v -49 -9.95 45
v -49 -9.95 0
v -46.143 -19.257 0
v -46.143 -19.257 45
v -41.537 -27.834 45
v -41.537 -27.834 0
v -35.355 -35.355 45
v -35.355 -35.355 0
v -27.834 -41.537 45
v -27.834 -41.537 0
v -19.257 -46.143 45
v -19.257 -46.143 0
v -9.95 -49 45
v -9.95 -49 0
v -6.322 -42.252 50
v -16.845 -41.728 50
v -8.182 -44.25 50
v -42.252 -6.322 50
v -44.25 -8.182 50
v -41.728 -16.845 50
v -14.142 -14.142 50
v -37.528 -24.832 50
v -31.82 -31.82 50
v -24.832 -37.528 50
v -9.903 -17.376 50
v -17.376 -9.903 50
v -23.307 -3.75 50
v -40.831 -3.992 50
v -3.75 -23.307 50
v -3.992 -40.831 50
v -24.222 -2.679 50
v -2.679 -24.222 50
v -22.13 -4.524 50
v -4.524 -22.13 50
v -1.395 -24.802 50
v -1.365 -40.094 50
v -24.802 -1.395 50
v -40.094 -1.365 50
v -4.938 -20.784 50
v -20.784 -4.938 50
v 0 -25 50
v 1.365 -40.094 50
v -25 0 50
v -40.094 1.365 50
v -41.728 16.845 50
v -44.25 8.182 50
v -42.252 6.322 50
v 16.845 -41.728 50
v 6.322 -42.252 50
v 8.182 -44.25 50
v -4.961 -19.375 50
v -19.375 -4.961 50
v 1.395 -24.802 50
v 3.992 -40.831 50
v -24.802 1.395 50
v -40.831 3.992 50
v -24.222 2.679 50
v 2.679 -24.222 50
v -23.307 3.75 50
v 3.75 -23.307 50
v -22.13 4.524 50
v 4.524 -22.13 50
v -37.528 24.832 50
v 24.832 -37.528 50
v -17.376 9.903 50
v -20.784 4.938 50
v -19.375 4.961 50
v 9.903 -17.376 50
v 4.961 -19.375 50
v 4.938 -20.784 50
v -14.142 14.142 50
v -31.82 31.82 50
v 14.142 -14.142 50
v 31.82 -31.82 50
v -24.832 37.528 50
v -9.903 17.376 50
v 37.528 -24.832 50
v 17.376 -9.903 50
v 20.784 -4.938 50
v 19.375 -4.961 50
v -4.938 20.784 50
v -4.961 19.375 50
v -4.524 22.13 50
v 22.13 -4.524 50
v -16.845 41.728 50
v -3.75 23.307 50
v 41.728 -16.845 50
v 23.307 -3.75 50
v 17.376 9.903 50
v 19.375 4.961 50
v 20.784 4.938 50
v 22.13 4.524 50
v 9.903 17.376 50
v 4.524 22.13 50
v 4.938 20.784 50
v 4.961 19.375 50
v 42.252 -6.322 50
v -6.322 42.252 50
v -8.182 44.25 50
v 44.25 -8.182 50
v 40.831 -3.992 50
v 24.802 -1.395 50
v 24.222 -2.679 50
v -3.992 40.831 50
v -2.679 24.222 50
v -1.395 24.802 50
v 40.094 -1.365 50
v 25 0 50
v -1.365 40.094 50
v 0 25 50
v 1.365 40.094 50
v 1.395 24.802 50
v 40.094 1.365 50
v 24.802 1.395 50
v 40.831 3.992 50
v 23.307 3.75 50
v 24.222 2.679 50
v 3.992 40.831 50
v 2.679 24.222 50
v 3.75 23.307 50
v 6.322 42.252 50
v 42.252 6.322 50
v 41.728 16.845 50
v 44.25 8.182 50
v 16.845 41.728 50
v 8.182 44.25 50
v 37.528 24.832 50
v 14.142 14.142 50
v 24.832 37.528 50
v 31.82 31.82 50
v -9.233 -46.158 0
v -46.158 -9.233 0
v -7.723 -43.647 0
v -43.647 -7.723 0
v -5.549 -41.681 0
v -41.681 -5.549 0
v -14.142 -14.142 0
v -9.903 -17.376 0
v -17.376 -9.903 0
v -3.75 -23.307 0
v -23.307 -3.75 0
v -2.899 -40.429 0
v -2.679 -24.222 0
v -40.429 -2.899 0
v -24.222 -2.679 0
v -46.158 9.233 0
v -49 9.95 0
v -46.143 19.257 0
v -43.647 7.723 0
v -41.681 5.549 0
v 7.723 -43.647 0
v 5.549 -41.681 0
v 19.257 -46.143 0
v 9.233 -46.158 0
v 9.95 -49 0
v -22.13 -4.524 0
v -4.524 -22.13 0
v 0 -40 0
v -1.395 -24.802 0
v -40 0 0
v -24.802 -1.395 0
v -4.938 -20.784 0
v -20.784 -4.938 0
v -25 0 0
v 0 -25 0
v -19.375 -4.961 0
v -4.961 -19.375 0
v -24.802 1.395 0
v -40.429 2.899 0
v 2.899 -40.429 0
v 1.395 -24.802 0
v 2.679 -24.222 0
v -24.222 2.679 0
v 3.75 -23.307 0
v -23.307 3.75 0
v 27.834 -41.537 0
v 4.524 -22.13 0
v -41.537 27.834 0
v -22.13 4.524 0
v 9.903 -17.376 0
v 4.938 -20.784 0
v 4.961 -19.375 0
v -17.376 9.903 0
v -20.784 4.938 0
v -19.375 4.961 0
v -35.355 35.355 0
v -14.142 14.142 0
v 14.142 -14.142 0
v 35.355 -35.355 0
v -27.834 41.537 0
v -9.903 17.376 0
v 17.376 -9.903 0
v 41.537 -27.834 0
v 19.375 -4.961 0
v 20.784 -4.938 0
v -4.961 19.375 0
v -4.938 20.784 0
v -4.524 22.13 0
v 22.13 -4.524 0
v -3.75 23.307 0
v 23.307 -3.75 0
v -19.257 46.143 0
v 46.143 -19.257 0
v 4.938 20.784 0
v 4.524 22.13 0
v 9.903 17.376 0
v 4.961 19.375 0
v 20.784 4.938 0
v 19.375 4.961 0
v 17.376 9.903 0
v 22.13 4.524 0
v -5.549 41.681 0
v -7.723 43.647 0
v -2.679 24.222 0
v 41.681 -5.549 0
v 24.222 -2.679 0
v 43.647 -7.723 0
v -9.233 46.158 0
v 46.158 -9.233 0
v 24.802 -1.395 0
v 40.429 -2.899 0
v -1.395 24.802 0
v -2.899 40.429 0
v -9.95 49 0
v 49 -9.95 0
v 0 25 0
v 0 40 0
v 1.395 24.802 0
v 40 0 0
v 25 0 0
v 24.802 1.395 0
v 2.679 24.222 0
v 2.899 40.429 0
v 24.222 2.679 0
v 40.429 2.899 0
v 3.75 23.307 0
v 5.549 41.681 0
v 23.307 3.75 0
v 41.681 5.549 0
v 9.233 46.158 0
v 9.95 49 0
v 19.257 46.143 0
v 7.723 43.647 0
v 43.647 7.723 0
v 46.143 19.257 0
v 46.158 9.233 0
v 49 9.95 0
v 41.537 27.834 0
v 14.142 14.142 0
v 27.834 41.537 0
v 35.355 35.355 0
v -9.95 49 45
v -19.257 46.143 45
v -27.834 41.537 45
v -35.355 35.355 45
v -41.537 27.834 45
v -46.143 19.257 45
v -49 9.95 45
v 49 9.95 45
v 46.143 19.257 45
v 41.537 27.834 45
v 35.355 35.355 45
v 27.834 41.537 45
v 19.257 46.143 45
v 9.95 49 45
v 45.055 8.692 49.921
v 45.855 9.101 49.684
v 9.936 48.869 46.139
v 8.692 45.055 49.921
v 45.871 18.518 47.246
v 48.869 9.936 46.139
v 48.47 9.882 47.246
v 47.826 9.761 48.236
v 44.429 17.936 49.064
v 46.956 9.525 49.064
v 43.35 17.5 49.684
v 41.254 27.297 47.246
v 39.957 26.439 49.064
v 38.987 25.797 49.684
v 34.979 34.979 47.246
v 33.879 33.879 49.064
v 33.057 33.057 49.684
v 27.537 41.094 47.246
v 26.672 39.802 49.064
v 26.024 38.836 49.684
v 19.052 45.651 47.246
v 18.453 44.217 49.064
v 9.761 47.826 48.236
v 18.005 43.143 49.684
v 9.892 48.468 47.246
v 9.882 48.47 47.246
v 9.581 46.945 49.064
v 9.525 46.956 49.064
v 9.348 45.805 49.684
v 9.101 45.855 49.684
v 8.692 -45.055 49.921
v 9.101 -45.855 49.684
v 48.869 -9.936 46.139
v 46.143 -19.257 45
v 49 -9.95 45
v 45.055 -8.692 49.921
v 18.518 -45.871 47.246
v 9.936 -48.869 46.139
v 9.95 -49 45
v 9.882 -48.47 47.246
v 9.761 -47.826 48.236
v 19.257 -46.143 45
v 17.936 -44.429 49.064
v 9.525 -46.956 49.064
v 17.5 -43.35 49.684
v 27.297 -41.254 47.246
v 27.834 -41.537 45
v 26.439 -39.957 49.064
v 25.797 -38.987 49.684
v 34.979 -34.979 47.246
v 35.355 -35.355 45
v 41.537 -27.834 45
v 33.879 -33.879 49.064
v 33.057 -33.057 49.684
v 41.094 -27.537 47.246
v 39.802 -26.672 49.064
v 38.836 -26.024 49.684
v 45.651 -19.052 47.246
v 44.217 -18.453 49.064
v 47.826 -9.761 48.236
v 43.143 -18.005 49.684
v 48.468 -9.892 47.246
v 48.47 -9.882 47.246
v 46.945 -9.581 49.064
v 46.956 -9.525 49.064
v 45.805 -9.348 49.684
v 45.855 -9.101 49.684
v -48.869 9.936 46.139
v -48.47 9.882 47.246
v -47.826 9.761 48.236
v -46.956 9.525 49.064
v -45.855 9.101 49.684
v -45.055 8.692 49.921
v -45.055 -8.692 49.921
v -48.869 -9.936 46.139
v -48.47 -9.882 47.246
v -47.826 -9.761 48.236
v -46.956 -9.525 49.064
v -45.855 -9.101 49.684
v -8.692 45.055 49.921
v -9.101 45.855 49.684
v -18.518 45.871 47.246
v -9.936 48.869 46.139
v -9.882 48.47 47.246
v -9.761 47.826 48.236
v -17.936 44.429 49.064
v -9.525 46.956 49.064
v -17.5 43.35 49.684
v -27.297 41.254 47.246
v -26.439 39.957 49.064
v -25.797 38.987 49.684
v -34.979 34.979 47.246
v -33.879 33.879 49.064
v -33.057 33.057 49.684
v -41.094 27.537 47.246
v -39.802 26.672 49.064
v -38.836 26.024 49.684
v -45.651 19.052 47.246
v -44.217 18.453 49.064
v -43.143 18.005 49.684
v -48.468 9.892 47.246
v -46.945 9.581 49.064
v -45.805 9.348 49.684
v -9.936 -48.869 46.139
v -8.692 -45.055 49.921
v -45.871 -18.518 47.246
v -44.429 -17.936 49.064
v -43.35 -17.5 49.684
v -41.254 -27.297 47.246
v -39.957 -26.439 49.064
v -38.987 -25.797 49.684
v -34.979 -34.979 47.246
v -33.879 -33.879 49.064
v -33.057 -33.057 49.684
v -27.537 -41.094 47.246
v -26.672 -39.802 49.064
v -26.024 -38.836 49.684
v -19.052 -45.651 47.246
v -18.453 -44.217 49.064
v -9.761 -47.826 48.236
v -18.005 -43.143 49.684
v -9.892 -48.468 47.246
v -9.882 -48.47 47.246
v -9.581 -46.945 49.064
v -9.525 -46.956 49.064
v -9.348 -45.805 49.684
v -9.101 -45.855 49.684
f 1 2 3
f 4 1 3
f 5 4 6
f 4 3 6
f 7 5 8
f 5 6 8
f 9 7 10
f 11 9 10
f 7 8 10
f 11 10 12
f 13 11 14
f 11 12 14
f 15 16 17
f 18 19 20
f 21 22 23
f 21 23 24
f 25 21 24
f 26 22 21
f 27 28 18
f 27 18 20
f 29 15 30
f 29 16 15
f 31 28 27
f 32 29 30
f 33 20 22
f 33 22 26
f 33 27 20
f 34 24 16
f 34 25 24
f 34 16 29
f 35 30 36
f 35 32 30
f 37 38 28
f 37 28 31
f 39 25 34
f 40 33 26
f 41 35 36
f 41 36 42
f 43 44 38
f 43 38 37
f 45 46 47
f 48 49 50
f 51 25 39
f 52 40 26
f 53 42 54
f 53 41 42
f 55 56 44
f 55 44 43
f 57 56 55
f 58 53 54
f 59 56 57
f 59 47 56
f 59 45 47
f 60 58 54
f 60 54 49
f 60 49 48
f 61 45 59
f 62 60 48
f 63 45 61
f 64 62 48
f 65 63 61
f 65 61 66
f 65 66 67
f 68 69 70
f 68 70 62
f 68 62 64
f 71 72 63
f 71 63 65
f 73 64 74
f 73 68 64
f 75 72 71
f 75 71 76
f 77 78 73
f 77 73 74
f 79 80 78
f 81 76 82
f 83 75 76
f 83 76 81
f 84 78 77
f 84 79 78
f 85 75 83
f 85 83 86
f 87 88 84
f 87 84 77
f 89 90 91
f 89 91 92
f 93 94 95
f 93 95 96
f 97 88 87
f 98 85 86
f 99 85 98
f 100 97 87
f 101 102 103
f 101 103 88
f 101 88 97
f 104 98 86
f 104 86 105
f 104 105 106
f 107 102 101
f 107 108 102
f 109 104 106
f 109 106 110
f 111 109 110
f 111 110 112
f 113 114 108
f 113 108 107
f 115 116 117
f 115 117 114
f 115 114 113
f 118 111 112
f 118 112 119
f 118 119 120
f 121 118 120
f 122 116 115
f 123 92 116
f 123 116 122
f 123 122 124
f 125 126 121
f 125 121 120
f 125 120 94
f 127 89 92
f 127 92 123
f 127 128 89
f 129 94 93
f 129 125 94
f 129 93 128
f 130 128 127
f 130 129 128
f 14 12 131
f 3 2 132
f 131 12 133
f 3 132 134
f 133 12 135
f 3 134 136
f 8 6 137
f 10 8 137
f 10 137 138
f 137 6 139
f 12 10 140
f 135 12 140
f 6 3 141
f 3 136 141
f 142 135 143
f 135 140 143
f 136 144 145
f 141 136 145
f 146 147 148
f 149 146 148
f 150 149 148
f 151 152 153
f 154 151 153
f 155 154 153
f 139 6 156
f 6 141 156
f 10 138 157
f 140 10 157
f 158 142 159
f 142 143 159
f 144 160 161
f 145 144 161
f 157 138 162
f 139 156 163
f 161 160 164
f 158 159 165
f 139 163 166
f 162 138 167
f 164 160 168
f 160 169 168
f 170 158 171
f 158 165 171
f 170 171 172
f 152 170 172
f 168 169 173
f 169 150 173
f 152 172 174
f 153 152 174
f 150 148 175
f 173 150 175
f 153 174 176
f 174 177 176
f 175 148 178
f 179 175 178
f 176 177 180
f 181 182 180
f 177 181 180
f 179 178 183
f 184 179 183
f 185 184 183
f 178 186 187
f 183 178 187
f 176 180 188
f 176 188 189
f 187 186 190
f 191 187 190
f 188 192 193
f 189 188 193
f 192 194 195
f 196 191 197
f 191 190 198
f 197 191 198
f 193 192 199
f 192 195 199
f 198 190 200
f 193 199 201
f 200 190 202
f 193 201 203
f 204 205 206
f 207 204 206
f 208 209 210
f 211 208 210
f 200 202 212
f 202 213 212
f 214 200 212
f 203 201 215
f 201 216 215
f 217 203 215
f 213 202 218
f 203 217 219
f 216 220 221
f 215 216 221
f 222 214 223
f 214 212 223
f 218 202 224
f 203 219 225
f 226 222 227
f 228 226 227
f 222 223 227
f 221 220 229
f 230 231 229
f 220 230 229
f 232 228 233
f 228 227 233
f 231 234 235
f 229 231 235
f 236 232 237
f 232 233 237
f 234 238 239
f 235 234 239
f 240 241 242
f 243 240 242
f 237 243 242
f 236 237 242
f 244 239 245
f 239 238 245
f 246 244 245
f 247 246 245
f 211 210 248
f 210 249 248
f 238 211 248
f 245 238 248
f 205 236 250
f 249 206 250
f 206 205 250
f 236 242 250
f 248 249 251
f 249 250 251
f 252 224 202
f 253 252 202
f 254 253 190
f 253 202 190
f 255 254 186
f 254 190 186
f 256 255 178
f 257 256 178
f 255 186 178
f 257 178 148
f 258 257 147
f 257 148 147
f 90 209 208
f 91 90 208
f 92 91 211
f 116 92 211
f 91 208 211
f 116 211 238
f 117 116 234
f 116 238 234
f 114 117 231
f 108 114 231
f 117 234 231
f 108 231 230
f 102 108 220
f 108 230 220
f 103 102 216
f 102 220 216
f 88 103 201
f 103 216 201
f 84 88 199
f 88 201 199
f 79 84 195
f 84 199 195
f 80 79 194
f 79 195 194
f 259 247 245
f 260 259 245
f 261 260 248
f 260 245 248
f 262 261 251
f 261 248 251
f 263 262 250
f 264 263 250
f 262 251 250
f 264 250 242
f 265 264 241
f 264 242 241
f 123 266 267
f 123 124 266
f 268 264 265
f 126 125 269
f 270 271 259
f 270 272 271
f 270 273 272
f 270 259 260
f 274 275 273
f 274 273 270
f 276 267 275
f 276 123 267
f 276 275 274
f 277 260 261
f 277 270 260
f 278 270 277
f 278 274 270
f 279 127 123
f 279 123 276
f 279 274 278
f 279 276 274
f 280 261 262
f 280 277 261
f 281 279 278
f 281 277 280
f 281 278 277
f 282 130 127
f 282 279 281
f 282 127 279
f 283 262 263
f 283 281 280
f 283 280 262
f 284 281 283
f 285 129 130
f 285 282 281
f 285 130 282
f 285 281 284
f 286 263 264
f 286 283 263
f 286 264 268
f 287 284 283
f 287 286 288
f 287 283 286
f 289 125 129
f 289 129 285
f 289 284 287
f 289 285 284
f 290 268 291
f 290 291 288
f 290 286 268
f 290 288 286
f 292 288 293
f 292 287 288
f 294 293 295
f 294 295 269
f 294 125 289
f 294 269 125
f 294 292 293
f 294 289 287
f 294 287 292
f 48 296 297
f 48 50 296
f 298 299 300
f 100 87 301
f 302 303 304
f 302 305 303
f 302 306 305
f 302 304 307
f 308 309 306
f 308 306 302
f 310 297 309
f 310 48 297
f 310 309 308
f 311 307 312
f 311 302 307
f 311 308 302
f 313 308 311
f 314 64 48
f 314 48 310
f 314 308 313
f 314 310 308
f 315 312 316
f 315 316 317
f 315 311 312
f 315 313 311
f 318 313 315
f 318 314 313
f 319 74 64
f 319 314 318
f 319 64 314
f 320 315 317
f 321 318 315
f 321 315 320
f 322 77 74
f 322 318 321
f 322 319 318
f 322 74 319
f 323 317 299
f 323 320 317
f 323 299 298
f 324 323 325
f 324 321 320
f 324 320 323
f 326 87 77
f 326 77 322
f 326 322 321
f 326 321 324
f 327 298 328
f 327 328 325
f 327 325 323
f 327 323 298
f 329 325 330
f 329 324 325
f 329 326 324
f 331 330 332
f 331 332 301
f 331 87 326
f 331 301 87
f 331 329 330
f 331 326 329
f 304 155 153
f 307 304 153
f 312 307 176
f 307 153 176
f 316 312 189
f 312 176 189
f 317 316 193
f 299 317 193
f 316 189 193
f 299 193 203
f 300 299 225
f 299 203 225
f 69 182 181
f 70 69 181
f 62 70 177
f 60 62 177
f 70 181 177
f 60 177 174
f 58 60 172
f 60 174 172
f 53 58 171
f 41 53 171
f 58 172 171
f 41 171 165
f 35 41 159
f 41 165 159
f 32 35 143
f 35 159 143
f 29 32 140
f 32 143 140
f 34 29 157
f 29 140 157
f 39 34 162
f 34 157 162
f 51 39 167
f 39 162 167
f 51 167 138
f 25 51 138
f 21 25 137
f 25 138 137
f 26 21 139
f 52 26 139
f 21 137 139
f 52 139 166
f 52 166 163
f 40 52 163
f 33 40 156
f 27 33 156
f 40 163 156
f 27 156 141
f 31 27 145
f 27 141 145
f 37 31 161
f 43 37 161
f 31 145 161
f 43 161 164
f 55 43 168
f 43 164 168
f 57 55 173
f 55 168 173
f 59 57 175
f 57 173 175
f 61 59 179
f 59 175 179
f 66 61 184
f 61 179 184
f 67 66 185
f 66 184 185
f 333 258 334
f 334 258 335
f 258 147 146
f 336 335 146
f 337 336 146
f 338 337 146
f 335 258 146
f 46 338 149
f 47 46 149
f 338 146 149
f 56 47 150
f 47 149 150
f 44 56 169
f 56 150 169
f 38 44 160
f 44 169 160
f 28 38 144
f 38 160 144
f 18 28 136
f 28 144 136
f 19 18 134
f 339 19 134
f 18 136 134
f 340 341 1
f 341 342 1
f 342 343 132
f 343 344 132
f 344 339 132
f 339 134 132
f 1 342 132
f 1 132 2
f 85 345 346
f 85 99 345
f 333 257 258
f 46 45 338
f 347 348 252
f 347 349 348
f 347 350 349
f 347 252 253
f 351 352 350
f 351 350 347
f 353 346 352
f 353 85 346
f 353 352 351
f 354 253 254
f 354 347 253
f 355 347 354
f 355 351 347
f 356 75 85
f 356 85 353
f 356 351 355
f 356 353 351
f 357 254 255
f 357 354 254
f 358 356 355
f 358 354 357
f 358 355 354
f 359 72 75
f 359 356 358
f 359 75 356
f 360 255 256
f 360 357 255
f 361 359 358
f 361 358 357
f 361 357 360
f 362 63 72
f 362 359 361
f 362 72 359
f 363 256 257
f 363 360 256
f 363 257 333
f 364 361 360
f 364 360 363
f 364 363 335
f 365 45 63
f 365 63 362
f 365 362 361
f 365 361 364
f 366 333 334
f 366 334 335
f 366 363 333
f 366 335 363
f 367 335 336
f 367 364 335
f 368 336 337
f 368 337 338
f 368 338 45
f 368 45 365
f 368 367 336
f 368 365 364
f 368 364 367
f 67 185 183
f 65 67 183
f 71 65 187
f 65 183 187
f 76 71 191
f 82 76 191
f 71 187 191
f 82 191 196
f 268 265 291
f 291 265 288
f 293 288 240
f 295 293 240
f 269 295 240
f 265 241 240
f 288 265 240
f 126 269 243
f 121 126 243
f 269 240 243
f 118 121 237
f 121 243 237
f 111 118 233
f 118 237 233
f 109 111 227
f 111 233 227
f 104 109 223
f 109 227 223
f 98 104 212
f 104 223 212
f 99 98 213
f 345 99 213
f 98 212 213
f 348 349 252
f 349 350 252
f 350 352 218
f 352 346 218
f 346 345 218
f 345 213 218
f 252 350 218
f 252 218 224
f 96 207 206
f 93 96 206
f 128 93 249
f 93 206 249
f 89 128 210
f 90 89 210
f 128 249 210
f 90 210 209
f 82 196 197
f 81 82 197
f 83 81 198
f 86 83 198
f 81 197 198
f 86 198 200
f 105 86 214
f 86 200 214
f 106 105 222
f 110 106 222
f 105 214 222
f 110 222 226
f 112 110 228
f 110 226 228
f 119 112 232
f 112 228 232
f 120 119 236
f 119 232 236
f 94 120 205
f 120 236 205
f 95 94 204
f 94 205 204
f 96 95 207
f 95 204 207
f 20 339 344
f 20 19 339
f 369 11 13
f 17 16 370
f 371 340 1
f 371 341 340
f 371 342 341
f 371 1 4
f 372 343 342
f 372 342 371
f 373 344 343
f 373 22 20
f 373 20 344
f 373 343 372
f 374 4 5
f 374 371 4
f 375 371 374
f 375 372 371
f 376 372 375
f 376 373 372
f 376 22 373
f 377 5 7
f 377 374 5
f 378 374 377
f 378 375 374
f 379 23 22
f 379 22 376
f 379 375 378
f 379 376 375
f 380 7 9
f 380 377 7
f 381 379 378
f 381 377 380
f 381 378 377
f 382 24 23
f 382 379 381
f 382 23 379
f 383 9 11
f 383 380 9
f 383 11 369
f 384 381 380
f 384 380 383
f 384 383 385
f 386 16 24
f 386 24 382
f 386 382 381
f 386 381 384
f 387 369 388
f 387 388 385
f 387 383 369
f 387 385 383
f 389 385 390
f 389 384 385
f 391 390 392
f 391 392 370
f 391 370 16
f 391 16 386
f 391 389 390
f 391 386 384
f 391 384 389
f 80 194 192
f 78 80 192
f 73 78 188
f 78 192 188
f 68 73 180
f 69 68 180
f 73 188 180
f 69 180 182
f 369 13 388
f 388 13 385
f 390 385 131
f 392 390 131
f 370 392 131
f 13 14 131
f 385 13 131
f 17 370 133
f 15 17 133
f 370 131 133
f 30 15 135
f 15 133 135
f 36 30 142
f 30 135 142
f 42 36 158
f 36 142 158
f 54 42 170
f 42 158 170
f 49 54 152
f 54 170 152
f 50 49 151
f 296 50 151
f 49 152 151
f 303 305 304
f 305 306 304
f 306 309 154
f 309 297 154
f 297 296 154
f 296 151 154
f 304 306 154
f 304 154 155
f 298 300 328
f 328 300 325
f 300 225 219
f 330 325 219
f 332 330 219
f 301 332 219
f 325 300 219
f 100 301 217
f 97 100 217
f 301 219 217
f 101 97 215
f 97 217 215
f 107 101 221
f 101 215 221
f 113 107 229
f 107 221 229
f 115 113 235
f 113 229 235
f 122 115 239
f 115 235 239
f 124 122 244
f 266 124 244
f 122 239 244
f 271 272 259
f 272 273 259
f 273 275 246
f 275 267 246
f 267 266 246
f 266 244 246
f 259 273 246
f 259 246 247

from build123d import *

# Parameters (mm, degrees)
F1_DEPTH = 50
F5_R     = 5


# Not quite as in the source:
# - the program builds the solid bodies; features that only make, move or delete a surface that nothing else refers to are left out


with BuildPart() as f1:
    # F0 (on Top) → F1 (new body)
    with BuildSketch(Plane.XY):
        with BuildLine():
            ThreePointArc((9.9498743711, 49), (0, 40), (-9.9498743711, 49))
            ThreePointArc((-9.9498743711, 49), (-35.3553390593, 35.3553390593), (-49, 9.9498743711))
            ThreePointArc((-49, 9.9498743711), (-40, 0), (-49, -9.9498743711))
            ThreePointArc((-49, -9.9498743711), (-35.3553390593, -35.3553390593), (-9.9498743711, -49))
            ThreePointArc((-9.9498743711, -49), (0, -40), (9.9498743711, -49))
            ThreePointArc((9.9498743711, -49), (35.3553390593, -35.3553390593), (49, -9.9498743711))
            ThreePointArc((49, -9.9498743711), (40, 0), (49, 9.9498743711))
            ThreePointArc((49, 9.9498743711), (35.3553390593, 35.3553390593), (9.9498743711, 49))
        make_face()
        with BuildLine():
            ThreePointArc((-4.9607837082, -19.375), (-14.1421356237, -14.1421356237), (-19.375, -4.9607837082))
            ThreePointArc((-19.375, -4.9607837082), (-25, 0), (-19.375, 4.9607837082))
            ThreePointArc((-19.375, 4.9607837082), (-14.1421356237, 14.1421356237), (-4.9607837082, 19.375))
            ThreePointArc((-4.9607837082, 19.375), (0, 25), (4.9607837082, 19.375))
            ThreePointArc((4.9607837082, 19.375), (14.1421356237, 14.1421356237), (19.375, 4.9607837082))
            ThreePointArc((19.375, 4.9607837082), (25, 0), (19.375, -4.9607837082))
            ThreePointArc((19.375, -4.9607837082), (14.1421356237, -14.1421356237), (4.9607837082, -19.375))
            ThreePointArc((4.9607837082, -19.375), (0, -25), (-4.9607837082, -19.375))
        make_face(mode=Mode.SUBTRACT)
    extrude(amount=F1_DEPTH)

    # F5
    f5_edges = [f1.edges().sort_by_distance(p)[0] for p in [
        (35.355339, -35.355339, 50),
        (35.355339, 35.355339, 50),
        (-35.355339, -35.355339, 50),
        (-35.355339, 35.355339, 50),
    ]]
    fillet(f5_edges, radius=F5_R)


solid = f1.part
